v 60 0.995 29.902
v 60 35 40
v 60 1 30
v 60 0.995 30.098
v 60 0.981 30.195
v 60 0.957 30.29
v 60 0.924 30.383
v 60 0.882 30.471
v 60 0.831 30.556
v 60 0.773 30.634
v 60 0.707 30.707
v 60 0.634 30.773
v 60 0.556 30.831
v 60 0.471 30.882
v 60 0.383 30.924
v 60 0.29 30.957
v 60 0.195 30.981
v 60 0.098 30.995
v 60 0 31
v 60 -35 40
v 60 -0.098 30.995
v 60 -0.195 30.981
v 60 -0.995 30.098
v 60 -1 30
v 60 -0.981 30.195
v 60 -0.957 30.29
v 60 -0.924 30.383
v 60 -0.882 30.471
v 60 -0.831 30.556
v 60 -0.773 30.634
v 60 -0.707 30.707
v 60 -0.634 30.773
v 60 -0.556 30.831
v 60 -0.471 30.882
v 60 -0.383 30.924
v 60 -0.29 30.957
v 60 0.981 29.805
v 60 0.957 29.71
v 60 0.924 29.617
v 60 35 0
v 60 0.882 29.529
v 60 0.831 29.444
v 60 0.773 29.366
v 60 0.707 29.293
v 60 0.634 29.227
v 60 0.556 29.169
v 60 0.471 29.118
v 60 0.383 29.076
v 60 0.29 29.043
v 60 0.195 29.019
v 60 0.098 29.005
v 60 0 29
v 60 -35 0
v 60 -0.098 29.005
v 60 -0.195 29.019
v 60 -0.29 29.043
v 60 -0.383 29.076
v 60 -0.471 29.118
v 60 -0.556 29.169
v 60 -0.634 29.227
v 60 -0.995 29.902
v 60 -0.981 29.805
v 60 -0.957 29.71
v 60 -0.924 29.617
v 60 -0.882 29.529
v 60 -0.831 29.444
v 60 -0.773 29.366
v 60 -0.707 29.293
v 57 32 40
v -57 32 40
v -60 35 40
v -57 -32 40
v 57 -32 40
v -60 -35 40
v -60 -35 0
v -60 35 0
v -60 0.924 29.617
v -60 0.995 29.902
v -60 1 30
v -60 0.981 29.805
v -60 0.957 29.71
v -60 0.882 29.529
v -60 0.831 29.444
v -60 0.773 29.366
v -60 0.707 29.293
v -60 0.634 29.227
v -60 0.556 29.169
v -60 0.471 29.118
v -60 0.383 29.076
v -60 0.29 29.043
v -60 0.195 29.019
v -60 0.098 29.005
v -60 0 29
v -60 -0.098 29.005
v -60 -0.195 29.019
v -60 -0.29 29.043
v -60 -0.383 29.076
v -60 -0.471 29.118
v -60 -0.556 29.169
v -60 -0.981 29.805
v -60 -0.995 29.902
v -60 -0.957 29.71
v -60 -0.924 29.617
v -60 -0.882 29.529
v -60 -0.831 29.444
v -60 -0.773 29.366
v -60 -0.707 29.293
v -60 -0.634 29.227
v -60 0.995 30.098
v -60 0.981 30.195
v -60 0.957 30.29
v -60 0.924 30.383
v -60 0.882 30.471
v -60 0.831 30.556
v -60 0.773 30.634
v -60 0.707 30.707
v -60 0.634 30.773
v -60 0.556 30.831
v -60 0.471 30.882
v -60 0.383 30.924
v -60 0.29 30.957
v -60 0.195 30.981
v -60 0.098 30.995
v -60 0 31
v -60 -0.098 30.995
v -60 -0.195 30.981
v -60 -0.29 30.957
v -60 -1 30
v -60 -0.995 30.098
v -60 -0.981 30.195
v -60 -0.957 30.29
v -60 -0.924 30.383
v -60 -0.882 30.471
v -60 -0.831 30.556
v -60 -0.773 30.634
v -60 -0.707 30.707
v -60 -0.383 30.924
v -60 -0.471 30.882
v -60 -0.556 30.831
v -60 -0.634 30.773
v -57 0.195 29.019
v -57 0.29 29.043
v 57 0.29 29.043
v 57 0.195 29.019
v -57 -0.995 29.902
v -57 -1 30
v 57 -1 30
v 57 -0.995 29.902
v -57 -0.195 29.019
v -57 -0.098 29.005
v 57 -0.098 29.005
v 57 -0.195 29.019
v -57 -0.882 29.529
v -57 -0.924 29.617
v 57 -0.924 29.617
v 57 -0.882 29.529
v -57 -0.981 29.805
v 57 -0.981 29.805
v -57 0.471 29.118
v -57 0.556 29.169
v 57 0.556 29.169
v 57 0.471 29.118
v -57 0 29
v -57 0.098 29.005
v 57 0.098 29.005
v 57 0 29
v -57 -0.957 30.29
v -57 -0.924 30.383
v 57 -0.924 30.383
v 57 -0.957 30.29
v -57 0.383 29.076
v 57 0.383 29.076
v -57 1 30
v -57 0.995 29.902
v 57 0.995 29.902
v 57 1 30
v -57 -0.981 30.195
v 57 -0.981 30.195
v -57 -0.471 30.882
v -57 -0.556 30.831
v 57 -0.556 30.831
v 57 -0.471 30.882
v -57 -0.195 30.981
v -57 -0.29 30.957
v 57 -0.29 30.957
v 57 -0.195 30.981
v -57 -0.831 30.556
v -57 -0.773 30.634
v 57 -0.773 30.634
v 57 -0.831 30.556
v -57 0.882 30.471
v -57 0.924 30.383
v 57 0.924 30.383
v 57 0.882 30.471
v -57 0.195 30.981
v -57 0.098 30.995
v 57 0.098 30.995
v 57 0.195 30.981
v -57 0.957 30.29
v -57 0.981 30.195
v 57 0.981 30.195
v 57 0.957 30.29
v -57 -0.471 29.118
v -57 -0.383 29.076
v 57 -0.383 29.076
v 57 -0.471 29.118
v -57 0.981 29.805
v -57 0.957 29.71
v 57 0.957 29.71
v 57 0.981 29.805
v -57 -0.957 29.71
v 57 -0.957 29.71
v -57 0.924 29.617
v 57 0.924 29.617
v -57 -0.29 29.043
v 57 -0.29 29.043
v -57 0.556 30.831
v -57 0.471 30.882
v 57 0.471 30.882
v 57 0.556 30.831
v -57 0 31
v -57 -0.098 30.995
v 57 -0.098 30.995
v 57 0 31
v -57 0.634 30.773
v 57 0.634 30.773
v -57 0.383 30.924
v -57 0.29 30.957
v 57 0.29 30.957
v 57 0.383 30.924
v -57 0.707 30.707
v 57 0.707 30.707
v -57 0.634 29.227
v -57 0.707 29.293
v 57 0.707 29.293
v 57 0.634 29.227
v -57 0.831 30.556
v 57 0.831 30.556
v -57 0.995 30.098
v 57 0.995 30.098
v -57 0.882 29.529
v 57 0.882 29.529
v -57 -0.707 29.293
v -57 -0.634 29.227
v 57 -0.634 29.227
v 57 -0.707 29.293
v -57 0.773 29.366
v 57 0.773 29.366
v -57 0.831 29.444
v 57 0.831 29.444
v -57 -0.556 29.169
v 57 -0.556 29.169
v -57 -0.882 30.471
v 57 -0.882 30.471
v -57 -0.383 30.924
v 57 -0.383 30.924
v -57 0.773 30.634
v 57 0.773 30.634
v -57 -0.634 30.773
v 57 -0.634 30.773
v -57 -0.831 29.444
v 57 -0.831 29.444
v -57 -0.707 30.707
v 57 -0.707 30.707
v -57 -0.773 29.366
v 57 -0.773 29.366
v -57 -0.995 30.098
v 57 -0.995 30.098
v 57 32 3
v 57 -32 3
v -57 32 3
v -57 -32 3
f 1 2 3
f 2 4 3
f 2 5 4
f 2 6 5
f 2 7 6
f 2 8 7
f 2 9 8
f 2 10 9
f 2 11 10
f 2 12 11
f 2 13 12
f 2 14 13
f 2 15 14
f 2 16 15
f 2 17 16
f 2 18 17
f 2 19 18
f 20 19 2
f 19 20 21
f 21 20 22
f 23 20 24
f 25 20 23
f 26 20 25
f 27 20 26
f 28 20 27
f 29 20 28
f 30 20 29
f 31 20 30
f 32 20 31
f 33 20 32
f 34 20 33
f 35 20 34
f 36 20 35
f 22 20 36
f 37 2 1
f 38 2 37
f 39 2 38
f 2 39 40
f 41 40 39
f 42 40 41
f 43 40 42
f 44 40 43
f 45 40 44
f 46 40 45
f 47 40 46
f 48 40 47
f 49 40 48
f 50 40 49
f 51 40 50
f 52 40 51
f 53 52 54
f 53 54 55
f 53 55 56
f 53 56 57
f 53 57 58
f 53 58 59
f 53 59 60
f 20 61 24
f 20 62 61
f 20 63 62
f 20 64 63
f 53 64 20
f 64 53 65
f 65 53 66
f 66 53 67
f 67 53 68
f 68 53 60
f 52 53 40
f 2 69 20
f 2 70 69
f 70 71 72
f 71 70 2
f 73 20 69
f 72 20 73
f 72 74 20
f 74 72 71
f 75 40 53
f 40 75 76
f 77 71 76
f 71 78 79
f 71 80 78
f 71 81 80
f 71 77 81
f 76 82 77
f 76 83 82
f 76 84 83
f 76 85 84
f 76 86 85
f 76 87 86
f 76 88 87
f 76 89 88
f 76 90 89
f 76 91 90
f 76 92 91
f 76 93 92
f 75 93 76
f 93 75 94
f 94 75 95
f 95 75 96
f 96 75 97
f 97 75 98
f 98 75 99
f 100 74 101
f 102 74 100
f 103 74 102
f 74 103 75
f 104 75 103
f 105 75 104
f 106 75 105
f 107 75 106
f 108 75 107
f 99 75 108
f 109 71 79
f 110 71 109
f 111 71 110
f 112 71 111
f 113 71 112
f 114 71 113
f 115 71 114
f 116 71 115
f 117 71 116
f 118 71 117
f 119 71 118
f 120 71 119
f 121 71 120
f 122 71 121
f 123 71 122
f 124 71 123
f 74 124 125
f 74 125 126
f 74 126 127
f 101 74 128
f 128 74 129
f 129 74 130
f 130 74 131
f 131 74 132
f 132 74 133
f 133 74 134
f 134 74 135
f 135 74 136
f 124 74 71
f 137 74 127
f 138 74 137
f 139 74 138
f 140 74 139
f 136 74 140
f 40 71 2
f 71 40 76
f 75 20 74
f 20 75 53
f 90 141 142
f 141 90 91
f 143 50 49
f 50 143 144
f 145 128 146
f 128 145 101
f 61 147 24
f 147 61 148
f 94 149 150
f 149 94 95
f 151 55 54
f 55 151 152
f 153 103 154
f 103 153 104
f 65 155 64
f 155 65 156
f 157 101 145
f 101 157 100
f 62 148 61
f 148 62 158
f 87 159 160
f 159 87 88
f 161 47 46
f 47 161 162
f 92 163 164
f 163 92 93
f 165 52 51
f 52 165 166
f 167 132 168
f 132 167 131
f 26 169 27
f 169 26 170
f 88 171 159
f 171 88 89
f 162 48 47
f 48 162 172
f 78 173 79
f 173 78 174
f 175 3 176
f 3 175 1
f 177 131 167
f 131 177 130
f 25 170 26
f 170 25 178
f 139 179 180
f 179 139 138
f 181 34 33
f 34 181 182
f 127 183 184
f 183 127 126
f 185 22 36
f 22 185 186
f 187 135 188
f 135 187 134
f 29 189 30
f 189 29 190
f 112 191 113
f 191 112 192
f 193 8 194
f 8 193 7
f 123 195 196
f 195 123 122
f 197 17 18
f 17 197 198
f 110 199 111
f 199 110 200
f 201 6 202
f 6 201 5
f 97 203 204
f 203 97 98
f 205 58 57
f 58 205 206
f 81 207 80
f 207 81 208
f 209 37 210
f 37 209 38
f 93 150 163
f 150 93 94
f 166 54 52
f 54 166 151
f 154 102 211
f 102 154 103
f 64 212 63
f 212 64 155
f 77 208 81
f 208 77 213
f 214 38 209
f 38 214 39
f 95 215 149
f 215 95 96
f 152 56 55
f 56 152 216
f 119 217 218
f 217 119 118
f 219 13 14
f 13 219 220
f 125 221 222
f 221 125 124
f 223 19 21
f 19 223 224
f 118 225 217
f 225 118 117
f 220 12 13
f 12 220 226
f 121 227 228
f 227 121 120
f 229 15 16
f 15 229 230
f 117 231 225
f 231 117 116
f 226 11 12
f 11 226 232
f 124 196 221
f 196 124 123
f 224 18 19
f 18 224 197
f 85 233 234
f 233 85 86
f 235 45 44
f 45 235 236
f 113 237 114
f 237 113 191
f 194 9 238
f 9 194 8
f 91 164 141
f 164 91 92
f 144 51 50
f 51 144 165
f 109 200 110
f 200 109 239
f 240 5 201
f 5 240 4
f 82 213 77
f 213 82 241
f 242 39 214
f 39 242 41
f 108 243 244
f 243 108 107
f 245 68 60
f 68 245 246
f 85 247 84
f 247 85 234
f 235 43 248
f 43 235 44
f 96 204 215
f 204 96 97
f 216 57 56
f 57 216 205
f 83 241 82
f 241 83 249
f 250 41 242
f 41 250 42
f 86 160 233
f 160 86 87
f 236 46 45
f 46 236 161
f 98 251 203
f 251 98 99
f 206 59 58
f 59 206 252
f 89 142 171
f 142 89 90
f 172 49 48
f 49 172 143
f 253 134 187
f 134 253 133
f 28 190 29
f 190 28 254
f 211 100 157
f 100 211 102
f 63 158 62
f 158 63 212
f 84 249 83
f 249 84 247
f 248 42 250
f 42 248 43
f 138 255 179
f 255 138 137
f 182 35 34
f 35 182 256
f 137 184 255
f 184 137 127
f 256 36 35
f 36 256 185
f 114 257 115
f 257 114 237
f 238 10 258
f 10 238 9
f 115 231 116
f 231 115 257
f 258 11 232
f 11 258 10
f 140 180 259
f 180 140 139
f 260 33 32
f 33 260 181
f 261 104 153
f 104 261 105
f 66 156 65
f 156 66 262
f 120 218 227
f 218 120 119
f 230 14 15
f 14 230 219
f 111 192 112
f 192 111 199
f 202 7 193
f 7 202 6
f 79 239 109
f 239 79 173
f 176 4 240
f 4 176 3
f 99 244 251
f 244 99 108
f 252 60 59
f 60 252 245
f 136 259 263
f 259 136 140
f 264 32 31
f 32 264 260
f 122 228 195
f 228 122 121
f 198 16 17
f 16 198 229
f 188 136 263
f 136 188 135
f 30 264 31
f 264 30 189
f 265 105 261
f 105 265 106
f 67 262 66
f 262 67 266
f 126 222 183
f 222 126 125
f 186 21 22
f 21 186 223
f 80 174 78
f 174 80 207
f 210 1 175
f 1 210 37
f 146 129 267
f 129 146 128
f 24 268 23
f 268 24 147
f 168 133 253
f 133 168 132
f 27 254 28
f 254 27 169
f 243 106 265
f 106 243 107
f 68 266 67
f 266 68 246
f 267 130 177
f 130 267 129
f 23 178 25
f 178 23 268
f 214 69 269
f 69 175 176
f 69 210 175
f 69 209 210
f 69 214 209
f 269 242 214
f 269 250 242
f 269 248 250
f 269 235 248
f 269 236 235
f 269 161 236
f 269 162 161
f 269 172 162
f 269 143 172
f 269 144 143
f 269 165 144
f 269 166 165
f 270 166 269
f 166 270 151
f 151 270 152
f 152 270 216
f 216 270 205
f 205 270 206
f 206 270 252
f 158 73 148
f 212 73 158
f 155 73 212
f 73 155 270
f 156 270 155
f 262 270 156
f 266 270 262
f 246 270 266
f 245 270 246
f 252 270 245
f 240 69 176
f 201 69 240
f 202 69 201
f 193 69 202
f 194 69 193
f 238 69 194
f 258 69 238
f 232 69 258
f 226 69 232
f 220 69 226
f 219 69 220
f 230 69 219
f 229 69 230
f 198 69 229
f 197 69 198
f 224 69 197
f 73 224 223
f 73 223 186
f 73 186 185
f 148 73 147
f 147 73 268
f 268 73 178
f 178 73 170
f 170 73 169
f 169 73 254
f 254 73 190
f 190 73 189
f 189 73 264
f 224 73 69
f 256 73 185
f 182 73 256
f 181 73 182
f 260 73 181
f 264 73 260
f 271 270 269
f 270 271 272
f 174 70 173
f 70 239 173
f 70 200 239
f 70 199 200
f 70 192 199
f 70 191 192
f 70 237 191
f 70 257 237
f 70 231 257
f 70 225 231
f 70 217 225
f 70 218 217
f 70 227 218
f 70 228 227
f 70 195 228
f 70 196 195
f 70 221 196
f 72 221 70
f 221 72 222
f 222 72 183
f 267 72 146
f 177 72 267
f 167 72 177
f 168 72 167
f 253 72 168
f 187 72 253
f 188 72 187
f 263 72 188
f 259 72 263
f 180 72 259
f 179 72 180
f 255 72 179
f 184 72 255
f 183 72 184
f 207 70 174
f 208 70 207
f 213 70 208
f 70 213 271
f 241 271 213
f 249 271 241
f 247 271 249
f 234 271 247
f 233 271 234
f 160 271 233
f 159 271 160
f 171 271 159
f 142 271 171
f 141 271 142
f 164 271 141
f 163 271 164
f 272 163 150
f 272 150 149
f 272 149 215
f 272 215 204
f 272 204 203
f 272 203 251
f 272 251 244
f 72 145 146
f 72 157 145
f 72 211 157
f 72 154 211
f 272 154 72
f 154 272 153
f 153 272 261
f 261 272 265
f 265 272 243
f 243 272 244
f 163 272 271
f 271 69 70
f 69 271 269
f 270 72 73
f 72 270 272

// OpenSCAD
// --- Dimensions (mm) ---
outer_x = 120;          // Total length of the tank
outer_y = 70;           // Total width of the tank
outer_z = 40;           // Total height of the tank

wall_thickness = 3;     // Thickness of the walls and floor
floor_thickness = 3;    // Thickness of the floor

platform_length = 60;   // Length of the central platform (X direction)
platform_height = 13;   // Height of the platform top from the inner floor
platform_width = outer_y - (2 * wall_thickness); // Spans full inner width

hole_diameter = 2;      // Diameter of electrode wire holes
hole_y_pos = 0;         // Y position of holes (centered on Y axis)
hole_z_pos = 30;        // Z position of holes (measured from the bottom of the tank)

// --- Resolution ---
$fn = 64;

// --- Model Construction ---

// The part is built starting from Z=0 to ensure it rests on the XY plane.
// We use a union of the shell and platform, then subtract the cavity and holes.

module tank_geometry() {
    difference() {
        // 1. The Solid Body (Outer shell + Internal Platform)
        union() {
            // The main outer block (Base at Z=0)
            cube([outer_x, outer_y, outer_z]);

            // The Platform
            // The platform is centered in X.
            // Its top is at: floor_thickness + platform_height
            // Its bottom is at: floor_thickness
            // To center it in Y: (outer_y - platform_width) / 2
            translate([
                (outer_x - platform_length) / 2, 
                (outer_y - platform_width) / 2, 
                floor_thickness
            ])
            cube([platform_length, platform_width, platform_height]);
        }

        // 2. The Inner Cavity (The space where buffer goes)
        // We subtract the void from the floor_thickness up to the top.
        // We extend the subtraction slightly to ensure the top is open.
        translate([wall_thickness, wall_thickness, floor_thickness])
            cube([outer_x - 2*wall_thickness, outer_y - 2*wall_thickness, outer_z + 0.1]);

        // 3. The Electrode Holes
        // The user specified holes through the X-end walls at y=0, z=30.
        // In our coordinate system (0,0,0 is a corner), the center of the tank is at Y = outer_y/2.
        // The user's "y=0" refers to the center of the Y-axis of the tank.
        // The hole is at Z = 30.
        // We drill through the X-axis (the length of the tank).
        
        // We use a single long cylinder to ensure it cuts through the entire X-span.
        // We use a loop to ensure the hole is cut through both end walls.
        for (x_offset = [-1, outer_x]) {
            translate([x_offset, outer_y/2, hole_z_pos])
                rotate([0, 90, 0])
                    cylinder(d = hole_diameter, h = outer_x + 2, center = true);
        }
    }
}

// Final Assembly:
// The geometry is built from (0,0,0) as the corner.
// To center it on the X and Y axes as per the prompt:
translate([-outer_x/2, -outer_y/2, 0])
    tank_geometry();

// --- Verification of logic ---
// 1. Dimensions: 120x70x40. Correct.
// 2. Walls/Floor: 3mm. Correct.
// 3. Platform: 60mm long, spans full inner width, top is 13mm above inner floor. Correct.
// 4. Holes: 2mm diameter, at Y=0 (tank center), Z=30 (from bottom). Correct.
// 5. Orientation: Rests on XY plane at Z=0. Correct.
